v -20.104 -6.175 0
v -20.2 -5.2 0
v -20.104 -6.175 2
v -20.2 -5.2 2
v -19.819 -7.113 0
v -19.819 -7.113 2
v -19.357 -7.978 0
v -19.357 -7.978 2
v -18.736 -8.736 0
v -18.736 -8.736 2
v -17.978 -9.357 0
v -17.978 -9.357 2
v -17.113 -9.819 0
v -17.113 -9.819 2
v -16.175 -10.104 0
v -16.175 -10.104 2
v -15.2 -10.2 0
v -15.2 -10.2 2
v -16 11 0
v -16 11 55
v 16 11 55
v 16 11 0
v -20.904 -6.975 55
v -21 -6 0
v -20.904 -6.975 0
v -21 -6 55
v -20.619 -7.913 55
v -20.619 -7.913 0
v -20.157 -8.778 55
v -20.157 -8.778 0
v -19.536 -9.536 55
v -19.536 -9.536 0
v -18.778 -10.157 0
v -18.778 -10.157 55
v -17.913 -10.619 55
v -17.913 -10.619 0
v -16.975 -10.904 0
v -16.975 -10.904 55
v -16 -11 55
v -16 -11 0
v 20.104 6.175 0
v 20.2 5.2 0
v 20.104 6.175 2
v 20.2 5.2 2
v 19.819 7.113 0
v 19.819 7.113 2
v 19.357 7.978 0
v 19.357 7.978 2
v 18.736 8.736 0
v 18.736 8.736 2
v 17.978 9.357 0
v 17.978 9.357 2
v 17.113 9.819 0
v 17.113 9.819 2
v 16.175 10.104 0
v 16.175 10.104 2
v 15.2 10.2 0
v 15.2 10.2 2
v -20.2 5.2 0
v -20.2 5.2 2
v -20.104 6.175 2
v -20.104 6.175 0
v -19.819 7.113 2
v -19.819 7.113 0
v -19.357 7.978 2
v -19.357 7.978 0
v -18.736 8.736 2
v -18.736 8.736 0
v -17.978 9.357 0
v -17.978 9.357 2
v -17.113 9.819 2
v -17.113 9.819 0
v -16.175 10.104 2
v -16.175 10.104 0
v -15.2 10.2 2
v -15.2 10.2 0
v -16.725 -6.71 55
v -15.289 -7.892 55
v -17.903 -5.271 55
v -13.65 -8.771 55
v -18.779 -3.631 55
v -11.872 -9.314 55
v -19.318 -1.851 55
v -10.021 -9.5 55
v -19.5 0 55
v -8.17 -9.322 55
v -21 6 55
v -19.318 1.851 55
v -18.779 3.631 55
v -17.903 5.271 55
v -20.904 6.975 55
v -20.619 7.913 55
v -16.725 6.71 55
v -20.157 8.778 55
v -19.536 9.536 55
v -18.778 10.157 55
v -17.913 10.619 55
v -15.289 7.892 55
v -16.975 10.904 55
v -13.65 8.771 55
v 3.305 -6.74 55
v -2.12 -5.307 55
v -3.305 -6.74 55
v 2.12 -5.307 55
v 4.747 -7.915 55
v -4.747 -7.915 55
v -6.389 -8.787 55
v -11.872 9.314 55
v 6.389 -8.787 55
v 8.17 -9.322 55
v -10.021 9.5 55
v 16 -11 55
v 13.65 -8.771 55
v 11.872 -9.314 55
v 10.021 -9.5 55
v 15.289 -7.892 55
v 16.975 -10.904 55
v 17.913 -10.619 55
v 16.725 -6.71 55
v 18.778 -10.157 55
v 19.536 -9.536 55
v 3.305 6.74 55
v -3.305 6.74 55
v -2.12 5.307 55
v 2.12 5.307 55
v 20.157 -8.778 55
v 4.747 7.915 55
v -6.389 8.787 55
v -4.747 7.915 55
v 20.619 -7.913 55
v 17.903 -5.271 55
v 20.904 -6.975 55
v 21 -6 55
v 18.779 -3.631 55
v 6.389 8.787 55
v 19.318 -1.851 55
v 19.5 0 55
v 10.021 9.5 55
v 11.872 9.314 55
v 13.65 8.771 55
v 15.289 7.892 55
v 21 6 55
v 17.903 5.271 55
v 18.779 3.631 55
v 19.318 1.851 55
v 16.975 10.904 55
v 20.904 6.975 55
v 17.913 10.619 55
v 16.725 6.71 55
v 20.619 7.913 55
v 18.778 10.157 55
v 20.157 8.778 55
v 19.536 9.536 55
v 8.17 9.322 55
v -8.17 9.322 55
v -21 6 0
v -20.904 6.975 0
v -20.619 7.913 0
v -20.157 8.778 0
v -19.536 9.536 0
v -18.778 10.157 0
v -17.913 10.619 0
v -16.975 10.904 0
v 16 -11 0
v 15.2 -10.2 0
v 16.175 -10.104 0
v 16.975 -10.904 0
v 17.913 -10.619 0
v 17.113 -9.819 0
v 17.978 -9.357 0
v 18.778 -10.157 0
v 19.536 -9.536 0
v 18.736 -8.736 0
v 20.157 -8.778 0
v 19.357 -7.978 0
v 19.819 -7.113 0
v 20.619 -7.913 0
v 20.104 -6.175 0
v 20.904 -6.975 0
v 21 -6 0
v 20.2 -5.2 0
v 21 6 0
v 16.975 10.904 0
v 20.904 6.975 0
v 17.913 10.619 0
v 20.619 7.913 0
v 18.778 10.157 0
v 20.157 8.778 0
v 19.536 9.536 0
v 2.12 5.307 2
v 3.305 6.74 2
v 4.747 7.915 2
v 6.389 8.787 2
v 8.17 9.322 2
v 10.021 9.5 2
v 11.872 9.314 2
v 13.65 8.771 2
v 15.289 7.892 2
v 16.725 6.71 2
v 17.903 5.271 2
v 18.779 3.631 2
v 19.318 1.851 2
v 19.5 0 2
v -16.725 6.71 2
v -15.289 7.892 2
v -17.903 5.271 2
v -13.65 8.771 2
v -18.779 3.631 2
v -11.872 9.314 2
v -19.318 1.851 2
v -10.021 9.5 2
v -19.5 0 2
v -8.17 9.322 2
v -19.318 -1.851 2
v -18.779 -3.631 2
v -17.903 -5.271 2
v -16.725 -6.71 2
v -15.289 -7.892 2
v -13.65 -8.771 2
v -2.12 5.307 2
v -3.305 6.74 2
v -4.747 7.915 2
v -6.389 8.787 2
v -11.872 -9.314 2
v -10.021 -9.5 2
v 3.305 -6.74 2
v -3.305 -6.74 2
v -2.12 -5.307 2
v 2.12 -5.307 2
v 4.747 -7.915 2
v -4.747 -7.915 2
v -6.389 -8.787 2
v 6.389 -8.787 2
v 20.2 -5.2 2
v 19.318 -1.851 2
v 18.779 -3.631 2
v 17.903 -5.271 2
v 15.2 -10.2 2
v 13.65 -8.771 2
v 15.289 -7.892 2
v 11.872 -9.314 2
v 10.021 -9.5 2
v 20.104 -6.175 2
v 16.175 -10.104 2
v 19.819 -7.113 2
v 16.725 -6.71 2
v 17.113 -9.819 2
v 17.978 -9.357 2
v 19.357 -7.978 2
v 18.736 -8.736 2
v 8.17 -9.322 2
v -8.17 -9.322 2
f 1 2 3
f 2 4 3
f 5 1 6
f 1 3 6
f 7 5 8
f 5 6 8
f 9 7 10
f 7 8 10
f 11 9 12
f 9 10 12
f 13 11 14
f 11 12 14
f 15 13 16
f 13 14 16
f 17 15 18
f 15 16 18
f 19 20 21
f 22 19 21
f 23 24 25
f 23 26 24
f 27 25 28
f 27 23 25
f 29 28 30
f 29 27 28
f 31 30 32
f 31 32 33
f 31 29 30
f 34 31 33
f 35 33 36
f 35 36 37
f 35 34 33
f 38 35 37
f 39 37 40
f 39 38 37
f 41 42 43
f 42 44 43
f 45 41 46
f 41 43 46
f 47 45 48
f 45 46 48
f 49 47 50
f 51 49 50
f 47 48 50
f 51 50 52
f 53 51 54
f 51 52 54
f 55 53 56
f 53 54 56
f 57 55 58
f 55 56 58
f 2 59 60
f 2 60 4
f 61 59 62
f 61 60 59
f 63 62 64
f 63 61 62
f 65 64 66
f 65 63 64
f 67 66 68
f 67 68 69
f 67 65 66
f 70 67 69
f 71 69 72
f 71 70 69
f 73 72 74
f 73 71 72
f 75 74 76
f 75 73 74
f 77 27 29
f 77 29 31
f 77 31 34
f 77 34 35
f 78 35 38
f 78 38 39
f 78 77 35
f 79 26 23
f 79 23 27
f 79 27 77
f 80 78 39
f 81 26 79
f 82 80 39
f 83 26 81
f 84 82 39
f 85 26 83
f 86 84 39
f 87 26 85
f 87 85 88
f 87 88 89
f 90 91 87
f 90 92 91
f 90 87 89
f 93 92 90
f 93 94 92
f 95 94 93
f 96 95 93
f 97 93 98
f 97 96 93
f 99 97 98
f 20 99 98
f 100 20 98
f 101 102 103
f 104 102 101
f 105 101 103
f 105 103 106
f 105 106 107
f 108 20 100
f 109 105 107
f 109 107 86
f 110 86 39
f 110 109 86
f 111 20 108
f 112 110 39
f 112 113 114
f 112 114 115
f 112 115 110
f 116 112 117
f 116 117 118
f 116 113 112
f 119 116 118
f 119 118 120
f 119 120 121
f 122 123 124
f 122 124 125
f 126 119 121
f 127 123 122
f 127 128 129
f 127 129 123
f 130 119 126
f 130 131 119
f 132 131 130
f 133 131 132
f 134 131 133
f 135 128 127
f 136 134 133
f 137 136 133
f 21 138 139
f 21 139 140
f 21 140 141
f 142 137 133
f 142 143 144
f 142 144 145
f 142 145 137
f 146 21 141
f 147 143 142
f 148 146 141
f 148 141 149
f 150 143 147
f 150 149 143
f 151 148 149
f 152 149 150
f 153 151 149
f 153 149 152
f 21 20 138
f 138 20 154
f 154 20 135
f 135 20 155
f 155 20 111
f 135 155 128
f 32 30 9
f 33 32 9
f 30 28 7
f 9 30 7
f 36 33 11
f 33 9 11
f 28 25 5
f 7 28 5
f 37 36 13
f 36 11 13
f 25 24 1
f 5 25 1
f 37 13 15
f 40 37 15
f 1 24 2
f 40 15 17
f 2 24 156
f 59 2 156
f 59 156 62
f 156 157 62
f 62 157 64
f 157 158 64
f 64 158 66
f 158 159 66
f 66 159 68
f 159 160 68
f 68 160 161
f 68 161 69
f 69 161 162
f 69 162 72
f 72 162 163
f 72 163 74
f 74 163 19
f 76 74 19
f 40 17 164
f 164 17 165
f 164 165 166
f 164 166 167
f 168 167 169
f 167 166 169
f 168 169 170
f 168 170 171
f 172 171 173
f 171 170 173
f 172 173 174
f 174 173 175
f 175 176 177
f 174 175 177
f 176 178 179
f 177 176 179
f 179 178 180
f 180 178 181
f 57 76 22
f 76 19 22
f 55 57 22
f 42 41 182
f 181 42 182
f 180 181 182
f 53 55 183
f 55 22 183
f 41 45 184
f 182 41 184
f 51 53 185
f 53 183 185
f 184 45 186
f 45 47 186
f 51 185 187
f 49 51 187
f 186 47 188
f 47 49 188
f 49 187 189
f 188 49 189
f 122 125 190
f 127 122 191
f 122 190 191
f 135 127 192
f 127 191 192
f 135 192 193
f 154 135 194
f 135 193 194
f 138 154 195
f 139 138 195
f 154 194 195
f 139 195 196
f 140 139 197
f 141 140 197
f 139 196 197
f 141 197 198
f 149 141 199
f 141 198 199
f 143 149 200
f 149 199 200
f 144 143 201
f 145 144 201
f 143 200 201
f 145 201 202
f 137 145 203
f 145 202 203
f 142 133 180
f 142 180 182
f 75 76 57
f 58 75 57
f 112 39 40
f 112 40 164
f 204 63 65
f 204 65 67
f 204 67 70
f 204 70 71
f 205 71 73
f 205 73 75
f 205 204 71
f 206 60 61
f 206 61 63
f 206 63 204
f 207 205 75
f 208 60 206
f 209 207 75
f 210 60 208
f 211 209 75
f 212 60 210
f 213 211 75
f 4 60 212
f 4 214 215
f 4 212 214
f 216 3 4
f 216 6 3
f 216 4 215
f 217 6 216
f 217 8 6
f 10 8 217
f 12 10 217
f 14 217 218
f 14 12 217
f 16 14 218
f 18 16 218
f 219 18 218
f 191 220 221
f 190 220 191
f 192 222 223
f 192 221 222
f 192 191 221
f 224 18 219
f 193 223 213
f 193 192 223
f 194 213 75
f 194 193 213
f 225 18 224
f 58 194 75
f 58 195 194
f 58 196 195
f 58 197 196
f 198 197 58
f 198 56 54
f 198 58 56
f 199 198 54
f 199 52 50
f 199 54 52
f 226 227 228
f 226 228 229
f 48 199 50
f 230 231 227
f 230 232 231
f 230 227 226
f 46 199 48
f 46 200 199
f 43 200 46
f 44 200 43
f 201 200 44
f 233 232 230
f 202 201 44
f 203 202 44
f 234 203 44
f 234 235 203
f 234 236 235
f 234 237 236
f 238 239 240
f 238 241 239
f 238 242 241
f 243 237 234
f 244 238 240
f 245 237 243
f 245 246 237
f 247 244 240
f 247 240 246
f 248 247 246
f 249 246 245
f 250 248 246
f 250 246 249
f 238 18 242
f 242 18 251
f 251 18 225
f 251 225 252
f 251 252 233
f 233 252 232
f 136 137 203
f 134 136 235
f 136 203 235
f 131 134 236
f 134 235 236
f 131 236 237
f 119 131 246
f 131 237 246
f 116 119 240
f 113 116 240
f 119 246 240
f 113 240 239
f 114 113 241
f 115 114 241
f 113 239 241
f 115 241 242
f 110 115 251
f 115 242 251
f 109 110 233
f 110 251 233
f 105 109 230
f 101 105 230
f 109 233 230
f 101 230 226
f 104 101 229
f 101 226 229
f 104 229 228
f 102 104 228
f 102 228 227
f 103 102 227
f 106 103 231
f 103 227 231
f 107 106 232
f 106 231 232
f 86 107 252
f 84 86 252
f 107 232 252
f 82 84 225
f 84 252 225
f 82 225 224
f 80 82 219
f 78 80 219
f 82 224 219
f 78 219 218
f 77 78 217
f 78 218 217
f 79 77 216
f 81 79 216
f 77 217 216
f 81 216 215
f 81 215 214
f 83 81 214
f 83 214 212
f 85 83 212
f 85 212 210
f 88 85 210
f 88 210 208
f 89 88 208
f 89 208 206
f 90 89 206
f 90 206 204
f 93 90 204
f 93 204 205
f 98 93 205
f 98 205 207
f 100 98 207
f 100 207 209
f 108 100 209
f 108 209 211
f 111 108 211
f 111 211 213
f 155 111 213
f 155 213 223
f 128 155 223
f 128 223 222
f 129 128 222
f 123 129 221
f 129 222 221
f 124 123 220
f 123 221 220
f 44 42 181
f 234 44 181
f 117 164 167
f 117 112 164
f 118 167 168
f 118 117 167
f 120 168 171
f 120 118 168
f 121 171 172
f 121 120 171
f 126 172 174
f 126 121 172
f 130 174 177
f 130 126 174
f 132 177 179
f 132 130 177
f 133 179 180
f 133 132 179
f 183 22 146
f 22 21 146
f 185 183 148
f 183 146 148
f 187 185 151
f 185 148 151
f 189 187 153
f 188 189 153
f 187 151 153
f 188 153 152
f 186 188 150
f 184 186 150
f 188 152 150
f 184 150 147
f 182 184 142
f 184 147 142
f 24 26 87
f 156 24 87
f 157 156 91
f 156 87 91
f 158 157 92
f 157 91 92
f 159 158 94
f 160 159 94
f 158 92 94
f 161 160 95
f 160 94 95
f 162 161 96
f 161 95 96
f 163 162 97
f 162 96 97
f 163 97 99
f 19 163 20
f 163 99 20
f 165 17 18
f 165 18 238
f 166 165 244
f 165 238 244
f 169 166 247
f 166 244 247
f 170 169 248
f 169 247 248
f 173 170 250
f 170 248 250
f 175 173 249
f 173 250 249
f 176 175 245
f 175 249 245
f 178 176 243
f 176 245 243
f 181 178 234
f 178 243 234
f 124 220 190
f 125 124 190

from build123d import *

# Parameters (mm, degrees)
F0_W     = 42
F0_H     = 22
F1_DEPTH = 55
F2_W     = 40.4
F2_H     = 20.4
F3_DEPTH = 2
F4_R     = 5


with BuildPart() as f1:
    # F0 (on Top) → F1 (new body)
    with BuildSketch(Plane.XY):
        Rectangle(F0_W, F0_H)
        with BuildLine():
            ThreePointArc((-2.120368, -5.306732), (-19.5, 0), (-2.120368, 5.306732))
            Line((-2.120368, 5.306732), (2.120368, 5.306732))
            ThreePointArc((2.120368, 5.306732), (12.774302, 9.085882), (19.5, 0))
            ThreePointArc((19.5, 0), (12.774302, -9.085882), (2.120368, -5.306732))
            Line((2.120368, -5.306732), (-2.120368, -5.306732))
        make_face(mode=Mode.SUBTRACT)
    extrude(amount=F1_DEPTH)

    # F2 (on face) → F3 (cut)
    with BuildSketch(Plane(origin=(0, 0, 0), x_dir=(1, 0, 0), z_dir=(0, 0, -1))):
        Rectangle(F2_W, F2_H)
    extrude(amount=-F3_DEPTH, mode=Mode.SUBTRACT)

    # F4
    f4_edges = [f1.edges().sort_by_distance(p)[0] for p in [
        (-20.2, -10.2, 1),
        (20.2, -10.2, 1),
        (20.2, 10.2, 1),
        (-20.2, 10.2, 1),
        (21, -11, 27.5),
        (-21, -11, 27.5),
        (21, 11, 27.5),
        (-21, 11, 27.5),
    ]]
    fillet(f4_edges, radius=F4_R)


solid = f1.part
